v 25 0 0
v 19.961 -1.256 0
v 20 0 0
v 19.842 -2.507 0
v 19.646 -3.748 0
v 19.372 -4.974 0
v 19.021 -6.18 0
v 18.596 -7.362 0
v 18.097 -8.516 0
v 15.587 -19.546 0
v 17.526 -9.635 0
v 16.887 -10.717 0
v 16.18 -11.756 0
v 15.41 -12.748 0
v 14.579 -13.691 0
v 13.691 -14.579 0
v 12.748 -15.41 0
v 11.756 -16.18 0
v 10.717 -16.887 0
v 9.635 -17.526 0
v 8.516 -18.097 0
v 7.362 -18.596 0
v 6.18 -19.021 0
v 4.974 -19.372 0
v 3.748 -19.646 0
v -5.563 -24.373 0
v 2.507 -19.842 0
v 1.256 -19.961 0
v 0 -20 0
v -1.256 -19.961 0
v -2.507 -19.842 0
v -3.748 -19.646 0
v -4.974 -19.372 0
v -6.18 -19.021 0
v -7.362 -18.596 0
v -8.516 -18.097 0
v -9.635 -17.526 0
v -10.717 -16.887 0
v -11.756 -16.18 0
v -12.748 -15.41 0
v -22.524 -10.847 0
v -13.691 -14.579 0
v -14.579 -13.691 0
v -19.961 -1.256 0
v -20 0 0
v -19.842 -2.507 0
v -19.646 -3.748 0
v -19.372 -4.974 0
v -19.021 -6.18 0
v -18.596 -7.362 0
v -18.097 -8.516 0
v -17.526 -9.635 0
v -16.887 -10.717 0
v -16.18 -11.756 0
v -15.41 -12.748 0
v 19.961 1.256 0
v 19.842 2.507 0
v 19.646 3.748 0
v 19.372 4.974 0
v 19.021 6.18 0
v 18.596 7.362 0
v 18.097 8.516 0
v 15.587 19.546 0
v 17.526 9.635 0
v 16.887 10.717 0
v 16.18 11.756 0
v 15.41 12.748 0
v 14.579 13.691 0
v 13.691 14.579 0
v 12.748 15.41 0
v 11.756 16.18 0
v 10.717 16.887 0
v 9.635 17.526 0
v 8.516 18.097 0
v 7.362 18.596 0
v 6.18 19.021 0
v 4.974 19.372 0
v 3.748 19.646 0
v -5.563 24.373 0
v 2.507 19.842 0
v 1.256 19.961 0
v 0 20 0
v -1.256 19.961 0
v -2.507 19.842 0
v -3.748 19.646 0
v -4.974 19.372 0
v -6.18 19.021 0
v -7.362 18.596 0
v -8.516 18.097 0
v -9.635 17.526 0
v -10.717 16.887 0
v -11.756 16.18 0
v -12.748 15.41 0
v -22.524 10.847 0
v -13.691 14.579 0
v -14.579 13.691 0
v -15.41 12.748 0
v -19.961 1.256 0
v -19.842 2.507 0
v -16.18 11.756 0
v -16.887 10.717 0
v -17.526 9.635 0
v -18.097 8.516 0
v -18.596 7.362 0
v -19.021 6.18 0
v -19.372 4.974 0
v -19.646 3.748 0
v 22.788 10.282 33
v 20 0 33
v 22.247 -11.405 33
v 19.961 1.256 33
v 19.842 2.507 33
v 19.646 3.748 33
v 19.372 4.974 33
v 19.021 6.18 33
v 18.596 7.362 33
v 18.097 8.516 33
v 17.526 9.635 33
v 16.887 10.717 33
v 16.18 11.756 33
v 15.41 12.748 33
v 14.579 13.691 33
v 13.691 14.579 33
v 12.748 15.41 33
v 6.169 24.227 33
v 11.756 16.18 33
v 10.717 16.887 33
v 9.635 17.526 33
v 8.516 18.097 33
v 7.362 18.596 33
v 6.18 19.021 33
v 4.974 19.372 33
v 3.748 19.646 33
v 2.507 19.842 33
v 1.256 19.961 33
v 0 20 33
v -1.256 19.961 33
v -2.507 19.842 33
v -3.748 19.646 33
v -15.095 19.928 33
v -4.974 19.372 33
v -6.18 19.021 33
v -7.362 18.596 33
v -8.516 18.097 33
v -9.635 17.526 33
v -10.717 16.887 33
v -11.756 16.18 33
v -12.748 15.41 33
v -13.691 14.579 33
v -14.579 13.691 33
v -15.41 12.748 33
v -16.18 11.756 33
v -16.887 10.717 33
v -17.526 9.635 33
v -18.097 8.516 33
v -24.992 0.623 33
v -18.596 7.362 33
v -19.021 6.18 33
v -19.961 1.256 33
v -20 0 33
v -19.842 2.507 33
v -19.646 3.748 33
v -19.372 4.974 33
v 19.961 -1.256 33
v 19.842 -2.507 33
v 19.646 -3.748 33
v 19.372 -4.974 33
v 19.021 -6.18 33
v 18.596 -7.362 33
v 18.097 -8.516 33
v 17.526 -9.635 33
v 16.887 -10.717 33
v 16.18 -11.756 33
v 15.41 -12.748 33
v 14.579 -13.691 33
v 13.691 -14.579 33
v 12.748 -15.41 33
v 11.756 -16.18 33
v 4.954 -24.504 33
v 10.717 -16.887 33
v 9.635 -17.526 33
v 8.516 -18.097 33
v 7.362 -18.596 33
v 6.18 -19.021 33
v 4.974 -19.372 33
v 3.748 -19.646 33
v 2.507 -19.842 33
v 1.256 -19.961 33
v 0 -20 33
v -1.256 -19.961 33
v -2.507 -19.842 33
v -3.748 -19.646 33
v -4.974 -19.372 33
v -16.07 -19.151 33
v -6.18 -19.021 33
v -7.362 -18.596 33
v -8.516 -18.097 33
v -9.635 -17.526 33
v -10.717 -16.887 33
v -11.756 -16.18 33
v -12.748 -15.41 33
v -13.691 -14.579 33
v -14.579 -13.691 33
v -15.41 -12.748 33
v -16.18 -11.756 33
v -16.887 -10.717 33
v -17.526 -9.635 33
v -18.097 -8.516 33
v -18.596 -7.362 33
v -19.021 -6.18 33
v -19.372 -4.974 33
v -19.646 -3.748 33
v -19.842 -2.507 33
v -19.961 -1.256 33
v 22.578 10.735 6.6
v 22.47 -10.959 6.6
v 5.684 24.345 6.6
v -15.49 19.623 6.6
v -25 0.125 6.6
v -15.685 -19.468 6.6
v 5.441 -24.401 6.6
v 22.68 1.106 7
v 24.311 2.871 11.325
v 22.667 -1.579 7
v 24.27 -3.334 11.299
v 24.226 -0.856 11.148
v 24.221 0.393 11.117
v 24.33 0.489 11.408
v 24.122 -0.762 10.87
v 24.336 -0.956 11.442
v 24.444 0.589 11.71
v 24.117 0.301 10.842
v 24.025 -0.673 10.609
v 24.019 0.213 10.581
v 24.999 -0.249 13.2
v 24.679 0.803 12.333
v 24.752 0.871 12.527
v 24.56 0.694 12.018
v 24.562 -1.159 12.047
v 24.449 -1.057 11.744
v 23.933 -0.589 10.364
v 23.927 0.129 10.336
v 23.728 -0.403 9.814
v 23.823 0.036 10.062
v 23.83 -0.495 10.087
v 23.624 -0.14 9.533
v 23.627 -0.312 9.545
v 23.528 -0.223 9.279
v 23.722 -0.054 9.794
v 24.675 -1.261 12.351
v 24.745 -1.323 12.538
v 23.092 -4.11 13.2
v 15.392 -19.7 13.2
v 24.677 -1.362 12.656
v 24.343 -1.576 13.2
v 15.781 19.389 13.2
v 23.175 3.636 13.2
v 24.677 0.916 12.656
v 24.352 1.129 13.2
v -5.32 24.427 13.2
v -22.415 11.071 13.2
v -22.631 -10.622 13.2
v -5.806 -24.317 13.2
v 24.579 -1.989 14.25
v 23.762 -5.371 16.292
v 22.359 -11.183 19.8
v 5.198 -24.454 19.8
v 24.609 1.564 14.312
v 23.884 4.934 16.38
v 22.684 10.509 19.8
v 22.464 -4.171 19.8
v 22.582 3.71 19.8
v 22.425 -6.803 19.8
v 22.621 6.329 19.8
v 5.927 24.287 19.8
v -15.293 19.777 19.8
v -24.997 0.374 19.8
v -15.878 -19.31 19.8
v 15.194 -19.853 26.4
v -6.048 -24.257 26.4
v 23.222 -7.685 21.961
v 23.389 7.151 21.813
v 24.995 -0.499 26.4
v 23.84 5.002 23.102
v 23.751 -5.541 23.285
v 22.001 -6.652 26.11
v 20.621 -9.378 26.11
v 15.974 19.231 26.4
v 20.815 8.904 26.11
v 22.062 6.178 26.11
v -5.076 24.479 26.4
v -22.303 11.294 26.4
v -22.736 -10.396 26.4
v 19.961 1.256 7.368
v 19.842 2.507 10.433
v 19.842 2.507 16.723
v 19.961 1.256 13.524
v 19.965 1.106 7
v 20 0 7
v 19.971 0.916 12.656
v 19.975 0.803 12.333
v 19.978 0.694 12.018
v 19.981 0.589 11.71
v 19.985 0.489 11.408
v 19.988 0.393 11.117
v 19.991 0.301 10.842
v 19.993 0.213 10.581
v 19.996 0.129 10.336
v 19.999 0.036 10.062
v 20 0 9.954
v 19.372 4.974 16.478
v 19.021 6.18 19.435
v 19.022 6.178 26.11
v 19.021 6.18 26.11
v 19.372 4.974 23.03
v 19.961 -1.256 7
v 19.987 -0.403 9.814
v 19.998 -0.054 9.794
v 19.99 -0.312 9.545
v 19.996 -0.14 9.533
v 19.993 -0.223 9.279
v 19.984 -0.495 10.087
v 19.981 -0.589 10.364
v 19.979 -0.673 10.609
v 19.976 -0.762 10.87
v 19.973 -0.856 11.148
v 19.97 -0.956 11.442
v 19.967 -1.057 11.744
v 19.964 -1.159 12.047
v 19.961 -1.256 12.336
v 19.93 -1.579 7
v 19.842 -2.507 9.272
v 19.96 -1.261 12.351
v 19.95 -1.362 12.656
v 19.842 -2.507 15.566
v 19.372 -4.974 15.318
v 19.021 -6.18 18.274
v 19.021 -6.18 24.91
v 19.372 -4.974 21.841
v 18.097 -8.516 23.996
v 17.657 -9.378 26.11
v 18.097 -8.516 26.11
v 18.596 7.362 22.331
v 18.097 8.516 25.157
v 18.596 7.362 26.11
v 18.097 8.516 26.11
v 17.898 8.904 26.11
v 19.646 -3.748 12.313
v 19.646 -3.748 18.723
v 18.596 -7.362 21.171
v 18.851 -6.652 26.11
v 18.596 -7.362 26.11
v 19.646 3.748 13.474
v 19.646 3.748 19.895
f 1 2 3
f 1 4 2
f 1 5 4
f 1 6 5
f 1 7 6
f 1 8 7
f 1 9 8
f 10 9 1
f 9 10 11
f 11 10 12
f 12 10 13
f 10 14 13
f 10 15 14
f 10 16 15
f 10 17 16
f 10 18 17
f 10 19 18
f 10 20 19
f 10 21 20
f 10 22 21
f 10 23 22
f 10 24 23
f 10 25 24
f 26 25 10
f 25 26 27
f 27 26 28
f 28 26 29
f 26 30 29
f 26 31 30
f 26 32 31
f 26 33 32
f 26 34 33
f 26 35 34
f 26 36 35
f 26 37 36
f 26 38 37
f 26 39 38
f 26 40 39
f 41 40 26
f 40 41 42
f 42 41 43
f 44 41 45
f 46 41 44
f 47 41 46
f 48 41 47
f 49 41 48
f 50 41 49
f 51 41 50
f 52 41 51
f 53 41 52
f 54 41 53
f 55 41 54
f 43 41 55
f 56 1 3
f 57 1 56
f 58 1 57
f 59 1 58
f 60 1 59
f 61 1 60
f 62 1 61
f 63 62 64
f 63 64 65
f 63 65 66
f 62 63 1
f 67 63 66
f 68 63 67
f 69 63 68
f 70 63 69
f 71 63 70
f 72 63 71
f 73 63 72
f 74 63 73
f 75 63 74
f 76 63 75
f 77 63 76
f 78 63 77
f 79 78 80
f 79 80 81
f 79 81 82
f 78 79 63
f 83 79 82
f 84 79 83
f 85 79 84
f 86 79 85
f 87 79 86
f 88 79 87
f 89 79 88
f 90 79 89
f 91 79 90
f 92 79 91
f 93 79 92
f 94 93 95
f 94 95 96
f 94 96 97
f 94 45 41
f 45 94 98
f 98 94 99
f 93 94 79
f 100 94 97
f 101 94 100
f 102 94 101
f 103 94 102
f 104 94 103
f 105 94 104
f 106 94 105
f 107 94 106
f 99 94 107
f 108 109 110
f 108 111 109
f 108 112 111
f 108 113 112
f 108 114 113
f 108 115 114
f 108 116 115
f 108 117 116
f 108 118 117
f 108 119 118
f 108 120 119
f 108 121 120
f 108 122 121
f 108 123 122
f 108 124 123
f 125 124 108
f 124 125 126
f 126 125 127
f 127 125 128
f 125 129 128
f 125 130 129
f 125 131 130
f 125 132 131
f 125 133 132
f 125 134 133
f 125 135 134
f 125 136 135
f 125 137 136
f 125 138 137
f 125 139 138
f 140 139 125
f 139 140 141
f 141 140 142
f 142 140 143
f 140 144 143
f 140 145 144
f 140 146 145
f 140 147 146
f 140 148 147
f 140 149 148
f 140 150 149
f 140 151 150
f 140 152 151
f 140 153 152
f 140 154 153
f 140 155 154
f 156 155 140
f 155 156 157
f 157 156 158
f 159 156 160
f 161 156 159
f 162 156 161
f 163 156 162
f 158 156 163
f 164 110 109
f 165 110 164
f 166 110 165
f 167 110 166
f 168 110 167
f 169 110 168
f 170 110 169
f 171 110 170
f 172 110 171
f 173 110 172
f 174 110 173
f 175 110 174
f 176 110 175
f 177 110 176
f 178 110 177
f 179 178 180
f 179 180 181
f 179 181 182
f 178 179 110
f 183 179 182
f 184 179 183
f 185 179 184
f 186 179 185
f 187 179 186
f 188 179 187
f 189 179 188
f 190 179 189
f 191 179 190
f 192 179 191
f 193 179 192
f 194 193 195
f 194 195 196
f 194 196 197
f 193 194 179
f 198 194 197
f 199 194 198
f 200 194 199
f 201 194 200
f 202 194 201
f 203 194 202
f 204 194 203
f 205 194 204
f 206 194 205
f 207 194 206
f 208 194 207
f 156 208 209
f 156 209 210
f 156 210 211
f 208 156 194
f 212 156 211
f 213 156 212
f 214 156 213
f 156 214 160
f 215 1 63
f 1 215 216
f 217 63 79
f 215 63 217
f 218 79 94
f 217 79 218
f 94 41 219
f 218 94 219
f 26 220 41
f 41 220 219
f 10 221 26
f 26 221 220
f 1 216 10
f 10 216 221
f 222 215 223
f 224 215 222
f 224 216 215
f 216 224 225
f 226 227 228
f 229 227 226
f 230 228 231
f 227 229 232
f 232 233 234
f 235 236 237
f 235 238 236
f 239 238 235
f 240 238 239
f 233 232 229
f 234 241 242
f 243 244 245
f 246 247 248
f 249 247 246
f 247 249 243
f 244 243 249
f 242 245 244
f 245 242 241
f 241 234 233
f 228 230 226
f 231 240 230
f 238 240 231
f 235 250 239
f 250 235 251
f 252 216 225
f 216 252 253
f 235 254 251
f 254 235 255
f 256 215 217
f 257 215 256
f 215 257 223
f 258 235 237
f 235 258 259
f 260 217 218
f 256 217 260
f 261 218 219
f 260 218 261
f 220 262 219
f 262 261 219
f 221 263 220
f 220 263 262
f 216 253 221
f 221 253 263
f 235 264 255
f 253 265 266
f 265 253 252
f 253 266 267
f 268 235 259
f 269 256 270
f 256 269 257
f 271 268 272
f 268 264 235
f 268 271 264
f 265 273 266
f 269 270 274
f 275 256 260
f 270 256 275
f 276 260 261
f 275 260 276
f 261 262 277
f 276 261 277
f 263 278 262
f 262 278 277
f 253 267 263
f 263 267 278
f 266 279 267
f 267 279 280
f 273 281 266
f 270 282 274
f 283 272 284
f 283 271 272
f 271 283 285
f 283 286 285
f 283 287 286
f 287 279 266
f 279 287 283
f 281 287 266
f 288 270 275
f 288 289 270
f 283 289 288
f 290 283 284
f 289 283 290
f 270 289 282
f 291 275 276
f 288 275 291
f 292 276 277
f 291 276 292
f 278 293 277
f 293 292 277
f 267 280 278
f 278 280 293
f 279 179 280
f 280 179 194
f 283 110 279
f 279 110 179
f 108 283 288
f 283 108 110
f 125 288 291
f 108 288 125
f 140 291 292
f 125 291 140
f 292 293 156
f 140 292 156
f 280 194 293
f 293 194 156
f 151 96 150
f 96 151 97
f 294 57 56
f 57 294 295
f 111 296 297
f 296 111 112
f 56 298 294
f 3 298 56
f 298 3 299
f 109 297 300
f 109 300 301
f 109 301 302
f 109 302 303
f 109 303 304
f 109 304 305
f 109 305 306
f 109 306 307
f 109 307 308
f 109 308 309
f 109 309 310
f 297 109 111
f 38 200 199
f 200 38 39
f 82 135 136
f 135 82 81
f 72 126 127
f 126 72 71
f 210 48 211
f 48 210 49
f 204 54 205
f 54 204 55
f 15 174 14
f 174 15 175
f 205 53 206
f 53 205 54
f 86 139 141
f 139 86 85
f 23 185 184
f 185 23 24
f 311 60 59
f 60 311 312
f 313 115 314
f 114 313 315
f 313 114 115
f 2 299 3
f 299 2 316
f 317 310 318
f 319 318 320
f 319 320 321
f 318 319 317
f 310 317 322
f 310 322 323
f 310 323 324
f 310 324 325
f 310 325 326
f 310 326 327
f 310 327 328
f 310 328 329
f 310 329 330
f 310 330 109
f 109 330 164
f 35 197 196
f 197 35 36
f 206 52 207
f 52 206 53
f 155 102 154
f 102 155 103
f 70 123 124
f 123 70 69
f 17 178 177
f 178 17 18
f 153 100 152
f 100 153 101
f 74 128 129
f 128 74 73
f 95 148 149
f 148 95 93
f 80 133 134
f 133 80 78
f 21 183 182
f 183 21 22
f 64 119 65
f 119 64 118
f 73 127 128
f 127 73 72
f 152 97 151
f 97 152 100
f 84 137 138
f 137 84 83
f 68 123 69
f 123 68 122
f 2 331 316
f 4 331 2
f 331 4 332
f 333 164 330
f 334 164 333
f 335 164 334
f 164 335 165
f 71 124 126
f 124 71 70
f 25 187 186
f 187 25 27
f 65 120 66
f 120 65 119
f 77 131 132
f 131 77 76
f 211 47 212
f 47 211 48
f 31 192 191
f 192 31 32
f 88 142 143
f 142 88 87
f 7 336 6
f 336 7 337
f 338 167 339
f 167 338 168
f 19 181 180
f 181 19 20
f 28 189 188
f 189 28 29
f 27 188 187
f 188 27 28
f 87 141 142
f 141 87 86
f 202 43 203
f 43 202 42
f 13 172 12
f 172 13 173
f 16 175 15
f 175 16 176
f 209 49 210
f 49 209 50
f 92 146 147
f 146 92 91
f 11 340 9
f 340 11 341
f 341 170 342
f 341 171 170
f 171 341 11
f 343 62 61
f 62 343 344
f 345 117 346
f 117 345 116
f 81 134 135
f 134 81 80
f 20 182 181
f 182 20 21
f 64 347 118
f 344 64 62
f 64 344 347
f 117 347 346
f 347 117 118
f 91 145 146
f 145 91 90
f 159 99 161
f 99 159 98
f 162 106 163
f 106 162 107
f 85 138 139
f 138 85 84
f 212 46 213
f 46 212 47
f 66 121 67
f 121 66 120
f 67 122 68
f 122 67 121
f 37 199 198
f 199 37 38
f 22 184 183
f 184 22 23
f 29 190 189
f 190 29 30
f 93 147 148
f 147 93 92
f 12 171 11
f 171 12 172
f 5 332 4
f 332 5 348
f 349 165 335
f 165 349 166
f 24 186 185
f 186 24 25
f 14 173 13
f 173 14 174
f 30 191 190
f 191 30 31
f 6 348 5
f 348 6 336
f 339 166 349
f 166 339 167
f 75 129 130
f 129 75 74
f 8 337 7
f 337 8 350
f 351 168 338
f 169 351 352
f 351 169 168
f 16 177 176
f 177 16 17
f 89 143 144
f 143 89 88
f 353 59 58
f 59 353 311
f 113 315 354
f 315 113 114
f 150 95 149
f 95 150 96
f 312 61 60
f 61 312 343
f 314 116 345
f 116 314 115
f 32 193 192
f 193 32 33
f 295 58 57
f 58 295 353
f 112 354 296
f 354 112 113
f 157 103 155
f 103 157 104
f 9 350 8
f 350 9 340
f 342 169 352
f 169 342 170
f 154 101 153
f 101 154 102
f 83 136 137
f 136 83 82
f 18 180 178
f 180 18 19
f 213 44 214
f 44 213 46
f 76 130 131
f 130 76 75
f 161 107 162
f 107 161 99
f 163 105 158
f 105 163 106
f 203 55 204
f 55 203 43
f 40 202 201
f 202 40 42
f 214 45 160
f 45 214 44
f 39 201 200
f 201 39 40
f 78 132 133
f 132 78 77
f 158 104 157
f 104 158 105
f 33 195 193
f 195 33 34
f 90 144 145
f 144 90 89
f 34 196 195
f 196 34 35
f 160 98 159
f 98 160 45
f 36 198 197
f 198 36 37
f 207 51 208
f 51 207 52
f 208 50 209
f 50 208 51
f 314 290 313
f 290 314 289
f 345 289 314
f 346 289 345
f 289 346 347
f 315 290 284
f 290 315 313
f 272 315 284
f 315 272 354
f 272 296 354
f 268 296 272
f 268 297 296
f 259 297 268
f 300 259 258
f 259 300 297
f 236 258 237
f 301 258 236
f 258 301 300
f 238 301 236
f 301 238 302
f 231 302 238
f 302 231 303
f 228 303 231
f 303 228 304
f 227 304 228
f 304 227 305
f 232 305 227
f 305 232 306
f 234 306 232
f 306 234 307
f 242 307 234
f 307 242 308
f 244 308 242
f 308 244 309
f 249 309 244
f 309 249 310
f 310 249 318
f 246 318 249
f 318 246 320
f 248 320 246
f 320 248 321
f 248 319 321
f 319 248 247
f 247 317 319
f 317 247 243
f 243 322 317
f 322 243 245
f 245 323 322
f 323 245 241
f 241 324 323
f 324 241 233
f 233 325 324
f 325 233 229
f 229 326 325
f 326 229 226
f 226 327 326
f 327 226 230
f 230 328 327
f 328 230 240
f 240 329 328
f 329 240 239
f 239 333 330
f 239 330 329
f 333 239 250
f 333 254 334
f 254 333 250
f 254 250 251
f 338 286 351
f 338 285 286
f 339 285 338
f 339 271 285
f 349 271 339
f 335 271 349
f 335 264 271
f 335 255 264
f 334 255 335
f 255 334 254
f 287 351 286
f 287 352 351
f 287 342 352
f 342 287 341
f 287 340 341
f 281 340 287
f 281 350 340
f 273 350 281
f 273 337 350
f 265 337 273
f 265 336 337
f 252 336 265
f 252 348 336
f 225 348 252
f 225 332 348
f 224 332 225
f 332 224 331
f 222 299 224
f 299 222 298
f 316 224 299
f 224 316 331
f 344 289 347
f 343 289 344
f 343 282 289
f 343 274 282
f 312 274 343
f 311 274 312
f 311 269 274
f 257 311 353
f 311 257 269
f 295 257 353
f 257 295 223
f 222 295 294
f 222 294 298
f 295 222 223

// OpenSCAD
difference(){
    linear_extrude(33, twist = 130, slices = 5) circle(d = 50, $fn=7);
    
    translate([0, 0, -10]) cylinder(h = 50, d = 40, $fn=100);
    
    translate([10,-9.5,7]) rotate([90,0,90]) linear_extrude(20) text("V", size= 20);
};
